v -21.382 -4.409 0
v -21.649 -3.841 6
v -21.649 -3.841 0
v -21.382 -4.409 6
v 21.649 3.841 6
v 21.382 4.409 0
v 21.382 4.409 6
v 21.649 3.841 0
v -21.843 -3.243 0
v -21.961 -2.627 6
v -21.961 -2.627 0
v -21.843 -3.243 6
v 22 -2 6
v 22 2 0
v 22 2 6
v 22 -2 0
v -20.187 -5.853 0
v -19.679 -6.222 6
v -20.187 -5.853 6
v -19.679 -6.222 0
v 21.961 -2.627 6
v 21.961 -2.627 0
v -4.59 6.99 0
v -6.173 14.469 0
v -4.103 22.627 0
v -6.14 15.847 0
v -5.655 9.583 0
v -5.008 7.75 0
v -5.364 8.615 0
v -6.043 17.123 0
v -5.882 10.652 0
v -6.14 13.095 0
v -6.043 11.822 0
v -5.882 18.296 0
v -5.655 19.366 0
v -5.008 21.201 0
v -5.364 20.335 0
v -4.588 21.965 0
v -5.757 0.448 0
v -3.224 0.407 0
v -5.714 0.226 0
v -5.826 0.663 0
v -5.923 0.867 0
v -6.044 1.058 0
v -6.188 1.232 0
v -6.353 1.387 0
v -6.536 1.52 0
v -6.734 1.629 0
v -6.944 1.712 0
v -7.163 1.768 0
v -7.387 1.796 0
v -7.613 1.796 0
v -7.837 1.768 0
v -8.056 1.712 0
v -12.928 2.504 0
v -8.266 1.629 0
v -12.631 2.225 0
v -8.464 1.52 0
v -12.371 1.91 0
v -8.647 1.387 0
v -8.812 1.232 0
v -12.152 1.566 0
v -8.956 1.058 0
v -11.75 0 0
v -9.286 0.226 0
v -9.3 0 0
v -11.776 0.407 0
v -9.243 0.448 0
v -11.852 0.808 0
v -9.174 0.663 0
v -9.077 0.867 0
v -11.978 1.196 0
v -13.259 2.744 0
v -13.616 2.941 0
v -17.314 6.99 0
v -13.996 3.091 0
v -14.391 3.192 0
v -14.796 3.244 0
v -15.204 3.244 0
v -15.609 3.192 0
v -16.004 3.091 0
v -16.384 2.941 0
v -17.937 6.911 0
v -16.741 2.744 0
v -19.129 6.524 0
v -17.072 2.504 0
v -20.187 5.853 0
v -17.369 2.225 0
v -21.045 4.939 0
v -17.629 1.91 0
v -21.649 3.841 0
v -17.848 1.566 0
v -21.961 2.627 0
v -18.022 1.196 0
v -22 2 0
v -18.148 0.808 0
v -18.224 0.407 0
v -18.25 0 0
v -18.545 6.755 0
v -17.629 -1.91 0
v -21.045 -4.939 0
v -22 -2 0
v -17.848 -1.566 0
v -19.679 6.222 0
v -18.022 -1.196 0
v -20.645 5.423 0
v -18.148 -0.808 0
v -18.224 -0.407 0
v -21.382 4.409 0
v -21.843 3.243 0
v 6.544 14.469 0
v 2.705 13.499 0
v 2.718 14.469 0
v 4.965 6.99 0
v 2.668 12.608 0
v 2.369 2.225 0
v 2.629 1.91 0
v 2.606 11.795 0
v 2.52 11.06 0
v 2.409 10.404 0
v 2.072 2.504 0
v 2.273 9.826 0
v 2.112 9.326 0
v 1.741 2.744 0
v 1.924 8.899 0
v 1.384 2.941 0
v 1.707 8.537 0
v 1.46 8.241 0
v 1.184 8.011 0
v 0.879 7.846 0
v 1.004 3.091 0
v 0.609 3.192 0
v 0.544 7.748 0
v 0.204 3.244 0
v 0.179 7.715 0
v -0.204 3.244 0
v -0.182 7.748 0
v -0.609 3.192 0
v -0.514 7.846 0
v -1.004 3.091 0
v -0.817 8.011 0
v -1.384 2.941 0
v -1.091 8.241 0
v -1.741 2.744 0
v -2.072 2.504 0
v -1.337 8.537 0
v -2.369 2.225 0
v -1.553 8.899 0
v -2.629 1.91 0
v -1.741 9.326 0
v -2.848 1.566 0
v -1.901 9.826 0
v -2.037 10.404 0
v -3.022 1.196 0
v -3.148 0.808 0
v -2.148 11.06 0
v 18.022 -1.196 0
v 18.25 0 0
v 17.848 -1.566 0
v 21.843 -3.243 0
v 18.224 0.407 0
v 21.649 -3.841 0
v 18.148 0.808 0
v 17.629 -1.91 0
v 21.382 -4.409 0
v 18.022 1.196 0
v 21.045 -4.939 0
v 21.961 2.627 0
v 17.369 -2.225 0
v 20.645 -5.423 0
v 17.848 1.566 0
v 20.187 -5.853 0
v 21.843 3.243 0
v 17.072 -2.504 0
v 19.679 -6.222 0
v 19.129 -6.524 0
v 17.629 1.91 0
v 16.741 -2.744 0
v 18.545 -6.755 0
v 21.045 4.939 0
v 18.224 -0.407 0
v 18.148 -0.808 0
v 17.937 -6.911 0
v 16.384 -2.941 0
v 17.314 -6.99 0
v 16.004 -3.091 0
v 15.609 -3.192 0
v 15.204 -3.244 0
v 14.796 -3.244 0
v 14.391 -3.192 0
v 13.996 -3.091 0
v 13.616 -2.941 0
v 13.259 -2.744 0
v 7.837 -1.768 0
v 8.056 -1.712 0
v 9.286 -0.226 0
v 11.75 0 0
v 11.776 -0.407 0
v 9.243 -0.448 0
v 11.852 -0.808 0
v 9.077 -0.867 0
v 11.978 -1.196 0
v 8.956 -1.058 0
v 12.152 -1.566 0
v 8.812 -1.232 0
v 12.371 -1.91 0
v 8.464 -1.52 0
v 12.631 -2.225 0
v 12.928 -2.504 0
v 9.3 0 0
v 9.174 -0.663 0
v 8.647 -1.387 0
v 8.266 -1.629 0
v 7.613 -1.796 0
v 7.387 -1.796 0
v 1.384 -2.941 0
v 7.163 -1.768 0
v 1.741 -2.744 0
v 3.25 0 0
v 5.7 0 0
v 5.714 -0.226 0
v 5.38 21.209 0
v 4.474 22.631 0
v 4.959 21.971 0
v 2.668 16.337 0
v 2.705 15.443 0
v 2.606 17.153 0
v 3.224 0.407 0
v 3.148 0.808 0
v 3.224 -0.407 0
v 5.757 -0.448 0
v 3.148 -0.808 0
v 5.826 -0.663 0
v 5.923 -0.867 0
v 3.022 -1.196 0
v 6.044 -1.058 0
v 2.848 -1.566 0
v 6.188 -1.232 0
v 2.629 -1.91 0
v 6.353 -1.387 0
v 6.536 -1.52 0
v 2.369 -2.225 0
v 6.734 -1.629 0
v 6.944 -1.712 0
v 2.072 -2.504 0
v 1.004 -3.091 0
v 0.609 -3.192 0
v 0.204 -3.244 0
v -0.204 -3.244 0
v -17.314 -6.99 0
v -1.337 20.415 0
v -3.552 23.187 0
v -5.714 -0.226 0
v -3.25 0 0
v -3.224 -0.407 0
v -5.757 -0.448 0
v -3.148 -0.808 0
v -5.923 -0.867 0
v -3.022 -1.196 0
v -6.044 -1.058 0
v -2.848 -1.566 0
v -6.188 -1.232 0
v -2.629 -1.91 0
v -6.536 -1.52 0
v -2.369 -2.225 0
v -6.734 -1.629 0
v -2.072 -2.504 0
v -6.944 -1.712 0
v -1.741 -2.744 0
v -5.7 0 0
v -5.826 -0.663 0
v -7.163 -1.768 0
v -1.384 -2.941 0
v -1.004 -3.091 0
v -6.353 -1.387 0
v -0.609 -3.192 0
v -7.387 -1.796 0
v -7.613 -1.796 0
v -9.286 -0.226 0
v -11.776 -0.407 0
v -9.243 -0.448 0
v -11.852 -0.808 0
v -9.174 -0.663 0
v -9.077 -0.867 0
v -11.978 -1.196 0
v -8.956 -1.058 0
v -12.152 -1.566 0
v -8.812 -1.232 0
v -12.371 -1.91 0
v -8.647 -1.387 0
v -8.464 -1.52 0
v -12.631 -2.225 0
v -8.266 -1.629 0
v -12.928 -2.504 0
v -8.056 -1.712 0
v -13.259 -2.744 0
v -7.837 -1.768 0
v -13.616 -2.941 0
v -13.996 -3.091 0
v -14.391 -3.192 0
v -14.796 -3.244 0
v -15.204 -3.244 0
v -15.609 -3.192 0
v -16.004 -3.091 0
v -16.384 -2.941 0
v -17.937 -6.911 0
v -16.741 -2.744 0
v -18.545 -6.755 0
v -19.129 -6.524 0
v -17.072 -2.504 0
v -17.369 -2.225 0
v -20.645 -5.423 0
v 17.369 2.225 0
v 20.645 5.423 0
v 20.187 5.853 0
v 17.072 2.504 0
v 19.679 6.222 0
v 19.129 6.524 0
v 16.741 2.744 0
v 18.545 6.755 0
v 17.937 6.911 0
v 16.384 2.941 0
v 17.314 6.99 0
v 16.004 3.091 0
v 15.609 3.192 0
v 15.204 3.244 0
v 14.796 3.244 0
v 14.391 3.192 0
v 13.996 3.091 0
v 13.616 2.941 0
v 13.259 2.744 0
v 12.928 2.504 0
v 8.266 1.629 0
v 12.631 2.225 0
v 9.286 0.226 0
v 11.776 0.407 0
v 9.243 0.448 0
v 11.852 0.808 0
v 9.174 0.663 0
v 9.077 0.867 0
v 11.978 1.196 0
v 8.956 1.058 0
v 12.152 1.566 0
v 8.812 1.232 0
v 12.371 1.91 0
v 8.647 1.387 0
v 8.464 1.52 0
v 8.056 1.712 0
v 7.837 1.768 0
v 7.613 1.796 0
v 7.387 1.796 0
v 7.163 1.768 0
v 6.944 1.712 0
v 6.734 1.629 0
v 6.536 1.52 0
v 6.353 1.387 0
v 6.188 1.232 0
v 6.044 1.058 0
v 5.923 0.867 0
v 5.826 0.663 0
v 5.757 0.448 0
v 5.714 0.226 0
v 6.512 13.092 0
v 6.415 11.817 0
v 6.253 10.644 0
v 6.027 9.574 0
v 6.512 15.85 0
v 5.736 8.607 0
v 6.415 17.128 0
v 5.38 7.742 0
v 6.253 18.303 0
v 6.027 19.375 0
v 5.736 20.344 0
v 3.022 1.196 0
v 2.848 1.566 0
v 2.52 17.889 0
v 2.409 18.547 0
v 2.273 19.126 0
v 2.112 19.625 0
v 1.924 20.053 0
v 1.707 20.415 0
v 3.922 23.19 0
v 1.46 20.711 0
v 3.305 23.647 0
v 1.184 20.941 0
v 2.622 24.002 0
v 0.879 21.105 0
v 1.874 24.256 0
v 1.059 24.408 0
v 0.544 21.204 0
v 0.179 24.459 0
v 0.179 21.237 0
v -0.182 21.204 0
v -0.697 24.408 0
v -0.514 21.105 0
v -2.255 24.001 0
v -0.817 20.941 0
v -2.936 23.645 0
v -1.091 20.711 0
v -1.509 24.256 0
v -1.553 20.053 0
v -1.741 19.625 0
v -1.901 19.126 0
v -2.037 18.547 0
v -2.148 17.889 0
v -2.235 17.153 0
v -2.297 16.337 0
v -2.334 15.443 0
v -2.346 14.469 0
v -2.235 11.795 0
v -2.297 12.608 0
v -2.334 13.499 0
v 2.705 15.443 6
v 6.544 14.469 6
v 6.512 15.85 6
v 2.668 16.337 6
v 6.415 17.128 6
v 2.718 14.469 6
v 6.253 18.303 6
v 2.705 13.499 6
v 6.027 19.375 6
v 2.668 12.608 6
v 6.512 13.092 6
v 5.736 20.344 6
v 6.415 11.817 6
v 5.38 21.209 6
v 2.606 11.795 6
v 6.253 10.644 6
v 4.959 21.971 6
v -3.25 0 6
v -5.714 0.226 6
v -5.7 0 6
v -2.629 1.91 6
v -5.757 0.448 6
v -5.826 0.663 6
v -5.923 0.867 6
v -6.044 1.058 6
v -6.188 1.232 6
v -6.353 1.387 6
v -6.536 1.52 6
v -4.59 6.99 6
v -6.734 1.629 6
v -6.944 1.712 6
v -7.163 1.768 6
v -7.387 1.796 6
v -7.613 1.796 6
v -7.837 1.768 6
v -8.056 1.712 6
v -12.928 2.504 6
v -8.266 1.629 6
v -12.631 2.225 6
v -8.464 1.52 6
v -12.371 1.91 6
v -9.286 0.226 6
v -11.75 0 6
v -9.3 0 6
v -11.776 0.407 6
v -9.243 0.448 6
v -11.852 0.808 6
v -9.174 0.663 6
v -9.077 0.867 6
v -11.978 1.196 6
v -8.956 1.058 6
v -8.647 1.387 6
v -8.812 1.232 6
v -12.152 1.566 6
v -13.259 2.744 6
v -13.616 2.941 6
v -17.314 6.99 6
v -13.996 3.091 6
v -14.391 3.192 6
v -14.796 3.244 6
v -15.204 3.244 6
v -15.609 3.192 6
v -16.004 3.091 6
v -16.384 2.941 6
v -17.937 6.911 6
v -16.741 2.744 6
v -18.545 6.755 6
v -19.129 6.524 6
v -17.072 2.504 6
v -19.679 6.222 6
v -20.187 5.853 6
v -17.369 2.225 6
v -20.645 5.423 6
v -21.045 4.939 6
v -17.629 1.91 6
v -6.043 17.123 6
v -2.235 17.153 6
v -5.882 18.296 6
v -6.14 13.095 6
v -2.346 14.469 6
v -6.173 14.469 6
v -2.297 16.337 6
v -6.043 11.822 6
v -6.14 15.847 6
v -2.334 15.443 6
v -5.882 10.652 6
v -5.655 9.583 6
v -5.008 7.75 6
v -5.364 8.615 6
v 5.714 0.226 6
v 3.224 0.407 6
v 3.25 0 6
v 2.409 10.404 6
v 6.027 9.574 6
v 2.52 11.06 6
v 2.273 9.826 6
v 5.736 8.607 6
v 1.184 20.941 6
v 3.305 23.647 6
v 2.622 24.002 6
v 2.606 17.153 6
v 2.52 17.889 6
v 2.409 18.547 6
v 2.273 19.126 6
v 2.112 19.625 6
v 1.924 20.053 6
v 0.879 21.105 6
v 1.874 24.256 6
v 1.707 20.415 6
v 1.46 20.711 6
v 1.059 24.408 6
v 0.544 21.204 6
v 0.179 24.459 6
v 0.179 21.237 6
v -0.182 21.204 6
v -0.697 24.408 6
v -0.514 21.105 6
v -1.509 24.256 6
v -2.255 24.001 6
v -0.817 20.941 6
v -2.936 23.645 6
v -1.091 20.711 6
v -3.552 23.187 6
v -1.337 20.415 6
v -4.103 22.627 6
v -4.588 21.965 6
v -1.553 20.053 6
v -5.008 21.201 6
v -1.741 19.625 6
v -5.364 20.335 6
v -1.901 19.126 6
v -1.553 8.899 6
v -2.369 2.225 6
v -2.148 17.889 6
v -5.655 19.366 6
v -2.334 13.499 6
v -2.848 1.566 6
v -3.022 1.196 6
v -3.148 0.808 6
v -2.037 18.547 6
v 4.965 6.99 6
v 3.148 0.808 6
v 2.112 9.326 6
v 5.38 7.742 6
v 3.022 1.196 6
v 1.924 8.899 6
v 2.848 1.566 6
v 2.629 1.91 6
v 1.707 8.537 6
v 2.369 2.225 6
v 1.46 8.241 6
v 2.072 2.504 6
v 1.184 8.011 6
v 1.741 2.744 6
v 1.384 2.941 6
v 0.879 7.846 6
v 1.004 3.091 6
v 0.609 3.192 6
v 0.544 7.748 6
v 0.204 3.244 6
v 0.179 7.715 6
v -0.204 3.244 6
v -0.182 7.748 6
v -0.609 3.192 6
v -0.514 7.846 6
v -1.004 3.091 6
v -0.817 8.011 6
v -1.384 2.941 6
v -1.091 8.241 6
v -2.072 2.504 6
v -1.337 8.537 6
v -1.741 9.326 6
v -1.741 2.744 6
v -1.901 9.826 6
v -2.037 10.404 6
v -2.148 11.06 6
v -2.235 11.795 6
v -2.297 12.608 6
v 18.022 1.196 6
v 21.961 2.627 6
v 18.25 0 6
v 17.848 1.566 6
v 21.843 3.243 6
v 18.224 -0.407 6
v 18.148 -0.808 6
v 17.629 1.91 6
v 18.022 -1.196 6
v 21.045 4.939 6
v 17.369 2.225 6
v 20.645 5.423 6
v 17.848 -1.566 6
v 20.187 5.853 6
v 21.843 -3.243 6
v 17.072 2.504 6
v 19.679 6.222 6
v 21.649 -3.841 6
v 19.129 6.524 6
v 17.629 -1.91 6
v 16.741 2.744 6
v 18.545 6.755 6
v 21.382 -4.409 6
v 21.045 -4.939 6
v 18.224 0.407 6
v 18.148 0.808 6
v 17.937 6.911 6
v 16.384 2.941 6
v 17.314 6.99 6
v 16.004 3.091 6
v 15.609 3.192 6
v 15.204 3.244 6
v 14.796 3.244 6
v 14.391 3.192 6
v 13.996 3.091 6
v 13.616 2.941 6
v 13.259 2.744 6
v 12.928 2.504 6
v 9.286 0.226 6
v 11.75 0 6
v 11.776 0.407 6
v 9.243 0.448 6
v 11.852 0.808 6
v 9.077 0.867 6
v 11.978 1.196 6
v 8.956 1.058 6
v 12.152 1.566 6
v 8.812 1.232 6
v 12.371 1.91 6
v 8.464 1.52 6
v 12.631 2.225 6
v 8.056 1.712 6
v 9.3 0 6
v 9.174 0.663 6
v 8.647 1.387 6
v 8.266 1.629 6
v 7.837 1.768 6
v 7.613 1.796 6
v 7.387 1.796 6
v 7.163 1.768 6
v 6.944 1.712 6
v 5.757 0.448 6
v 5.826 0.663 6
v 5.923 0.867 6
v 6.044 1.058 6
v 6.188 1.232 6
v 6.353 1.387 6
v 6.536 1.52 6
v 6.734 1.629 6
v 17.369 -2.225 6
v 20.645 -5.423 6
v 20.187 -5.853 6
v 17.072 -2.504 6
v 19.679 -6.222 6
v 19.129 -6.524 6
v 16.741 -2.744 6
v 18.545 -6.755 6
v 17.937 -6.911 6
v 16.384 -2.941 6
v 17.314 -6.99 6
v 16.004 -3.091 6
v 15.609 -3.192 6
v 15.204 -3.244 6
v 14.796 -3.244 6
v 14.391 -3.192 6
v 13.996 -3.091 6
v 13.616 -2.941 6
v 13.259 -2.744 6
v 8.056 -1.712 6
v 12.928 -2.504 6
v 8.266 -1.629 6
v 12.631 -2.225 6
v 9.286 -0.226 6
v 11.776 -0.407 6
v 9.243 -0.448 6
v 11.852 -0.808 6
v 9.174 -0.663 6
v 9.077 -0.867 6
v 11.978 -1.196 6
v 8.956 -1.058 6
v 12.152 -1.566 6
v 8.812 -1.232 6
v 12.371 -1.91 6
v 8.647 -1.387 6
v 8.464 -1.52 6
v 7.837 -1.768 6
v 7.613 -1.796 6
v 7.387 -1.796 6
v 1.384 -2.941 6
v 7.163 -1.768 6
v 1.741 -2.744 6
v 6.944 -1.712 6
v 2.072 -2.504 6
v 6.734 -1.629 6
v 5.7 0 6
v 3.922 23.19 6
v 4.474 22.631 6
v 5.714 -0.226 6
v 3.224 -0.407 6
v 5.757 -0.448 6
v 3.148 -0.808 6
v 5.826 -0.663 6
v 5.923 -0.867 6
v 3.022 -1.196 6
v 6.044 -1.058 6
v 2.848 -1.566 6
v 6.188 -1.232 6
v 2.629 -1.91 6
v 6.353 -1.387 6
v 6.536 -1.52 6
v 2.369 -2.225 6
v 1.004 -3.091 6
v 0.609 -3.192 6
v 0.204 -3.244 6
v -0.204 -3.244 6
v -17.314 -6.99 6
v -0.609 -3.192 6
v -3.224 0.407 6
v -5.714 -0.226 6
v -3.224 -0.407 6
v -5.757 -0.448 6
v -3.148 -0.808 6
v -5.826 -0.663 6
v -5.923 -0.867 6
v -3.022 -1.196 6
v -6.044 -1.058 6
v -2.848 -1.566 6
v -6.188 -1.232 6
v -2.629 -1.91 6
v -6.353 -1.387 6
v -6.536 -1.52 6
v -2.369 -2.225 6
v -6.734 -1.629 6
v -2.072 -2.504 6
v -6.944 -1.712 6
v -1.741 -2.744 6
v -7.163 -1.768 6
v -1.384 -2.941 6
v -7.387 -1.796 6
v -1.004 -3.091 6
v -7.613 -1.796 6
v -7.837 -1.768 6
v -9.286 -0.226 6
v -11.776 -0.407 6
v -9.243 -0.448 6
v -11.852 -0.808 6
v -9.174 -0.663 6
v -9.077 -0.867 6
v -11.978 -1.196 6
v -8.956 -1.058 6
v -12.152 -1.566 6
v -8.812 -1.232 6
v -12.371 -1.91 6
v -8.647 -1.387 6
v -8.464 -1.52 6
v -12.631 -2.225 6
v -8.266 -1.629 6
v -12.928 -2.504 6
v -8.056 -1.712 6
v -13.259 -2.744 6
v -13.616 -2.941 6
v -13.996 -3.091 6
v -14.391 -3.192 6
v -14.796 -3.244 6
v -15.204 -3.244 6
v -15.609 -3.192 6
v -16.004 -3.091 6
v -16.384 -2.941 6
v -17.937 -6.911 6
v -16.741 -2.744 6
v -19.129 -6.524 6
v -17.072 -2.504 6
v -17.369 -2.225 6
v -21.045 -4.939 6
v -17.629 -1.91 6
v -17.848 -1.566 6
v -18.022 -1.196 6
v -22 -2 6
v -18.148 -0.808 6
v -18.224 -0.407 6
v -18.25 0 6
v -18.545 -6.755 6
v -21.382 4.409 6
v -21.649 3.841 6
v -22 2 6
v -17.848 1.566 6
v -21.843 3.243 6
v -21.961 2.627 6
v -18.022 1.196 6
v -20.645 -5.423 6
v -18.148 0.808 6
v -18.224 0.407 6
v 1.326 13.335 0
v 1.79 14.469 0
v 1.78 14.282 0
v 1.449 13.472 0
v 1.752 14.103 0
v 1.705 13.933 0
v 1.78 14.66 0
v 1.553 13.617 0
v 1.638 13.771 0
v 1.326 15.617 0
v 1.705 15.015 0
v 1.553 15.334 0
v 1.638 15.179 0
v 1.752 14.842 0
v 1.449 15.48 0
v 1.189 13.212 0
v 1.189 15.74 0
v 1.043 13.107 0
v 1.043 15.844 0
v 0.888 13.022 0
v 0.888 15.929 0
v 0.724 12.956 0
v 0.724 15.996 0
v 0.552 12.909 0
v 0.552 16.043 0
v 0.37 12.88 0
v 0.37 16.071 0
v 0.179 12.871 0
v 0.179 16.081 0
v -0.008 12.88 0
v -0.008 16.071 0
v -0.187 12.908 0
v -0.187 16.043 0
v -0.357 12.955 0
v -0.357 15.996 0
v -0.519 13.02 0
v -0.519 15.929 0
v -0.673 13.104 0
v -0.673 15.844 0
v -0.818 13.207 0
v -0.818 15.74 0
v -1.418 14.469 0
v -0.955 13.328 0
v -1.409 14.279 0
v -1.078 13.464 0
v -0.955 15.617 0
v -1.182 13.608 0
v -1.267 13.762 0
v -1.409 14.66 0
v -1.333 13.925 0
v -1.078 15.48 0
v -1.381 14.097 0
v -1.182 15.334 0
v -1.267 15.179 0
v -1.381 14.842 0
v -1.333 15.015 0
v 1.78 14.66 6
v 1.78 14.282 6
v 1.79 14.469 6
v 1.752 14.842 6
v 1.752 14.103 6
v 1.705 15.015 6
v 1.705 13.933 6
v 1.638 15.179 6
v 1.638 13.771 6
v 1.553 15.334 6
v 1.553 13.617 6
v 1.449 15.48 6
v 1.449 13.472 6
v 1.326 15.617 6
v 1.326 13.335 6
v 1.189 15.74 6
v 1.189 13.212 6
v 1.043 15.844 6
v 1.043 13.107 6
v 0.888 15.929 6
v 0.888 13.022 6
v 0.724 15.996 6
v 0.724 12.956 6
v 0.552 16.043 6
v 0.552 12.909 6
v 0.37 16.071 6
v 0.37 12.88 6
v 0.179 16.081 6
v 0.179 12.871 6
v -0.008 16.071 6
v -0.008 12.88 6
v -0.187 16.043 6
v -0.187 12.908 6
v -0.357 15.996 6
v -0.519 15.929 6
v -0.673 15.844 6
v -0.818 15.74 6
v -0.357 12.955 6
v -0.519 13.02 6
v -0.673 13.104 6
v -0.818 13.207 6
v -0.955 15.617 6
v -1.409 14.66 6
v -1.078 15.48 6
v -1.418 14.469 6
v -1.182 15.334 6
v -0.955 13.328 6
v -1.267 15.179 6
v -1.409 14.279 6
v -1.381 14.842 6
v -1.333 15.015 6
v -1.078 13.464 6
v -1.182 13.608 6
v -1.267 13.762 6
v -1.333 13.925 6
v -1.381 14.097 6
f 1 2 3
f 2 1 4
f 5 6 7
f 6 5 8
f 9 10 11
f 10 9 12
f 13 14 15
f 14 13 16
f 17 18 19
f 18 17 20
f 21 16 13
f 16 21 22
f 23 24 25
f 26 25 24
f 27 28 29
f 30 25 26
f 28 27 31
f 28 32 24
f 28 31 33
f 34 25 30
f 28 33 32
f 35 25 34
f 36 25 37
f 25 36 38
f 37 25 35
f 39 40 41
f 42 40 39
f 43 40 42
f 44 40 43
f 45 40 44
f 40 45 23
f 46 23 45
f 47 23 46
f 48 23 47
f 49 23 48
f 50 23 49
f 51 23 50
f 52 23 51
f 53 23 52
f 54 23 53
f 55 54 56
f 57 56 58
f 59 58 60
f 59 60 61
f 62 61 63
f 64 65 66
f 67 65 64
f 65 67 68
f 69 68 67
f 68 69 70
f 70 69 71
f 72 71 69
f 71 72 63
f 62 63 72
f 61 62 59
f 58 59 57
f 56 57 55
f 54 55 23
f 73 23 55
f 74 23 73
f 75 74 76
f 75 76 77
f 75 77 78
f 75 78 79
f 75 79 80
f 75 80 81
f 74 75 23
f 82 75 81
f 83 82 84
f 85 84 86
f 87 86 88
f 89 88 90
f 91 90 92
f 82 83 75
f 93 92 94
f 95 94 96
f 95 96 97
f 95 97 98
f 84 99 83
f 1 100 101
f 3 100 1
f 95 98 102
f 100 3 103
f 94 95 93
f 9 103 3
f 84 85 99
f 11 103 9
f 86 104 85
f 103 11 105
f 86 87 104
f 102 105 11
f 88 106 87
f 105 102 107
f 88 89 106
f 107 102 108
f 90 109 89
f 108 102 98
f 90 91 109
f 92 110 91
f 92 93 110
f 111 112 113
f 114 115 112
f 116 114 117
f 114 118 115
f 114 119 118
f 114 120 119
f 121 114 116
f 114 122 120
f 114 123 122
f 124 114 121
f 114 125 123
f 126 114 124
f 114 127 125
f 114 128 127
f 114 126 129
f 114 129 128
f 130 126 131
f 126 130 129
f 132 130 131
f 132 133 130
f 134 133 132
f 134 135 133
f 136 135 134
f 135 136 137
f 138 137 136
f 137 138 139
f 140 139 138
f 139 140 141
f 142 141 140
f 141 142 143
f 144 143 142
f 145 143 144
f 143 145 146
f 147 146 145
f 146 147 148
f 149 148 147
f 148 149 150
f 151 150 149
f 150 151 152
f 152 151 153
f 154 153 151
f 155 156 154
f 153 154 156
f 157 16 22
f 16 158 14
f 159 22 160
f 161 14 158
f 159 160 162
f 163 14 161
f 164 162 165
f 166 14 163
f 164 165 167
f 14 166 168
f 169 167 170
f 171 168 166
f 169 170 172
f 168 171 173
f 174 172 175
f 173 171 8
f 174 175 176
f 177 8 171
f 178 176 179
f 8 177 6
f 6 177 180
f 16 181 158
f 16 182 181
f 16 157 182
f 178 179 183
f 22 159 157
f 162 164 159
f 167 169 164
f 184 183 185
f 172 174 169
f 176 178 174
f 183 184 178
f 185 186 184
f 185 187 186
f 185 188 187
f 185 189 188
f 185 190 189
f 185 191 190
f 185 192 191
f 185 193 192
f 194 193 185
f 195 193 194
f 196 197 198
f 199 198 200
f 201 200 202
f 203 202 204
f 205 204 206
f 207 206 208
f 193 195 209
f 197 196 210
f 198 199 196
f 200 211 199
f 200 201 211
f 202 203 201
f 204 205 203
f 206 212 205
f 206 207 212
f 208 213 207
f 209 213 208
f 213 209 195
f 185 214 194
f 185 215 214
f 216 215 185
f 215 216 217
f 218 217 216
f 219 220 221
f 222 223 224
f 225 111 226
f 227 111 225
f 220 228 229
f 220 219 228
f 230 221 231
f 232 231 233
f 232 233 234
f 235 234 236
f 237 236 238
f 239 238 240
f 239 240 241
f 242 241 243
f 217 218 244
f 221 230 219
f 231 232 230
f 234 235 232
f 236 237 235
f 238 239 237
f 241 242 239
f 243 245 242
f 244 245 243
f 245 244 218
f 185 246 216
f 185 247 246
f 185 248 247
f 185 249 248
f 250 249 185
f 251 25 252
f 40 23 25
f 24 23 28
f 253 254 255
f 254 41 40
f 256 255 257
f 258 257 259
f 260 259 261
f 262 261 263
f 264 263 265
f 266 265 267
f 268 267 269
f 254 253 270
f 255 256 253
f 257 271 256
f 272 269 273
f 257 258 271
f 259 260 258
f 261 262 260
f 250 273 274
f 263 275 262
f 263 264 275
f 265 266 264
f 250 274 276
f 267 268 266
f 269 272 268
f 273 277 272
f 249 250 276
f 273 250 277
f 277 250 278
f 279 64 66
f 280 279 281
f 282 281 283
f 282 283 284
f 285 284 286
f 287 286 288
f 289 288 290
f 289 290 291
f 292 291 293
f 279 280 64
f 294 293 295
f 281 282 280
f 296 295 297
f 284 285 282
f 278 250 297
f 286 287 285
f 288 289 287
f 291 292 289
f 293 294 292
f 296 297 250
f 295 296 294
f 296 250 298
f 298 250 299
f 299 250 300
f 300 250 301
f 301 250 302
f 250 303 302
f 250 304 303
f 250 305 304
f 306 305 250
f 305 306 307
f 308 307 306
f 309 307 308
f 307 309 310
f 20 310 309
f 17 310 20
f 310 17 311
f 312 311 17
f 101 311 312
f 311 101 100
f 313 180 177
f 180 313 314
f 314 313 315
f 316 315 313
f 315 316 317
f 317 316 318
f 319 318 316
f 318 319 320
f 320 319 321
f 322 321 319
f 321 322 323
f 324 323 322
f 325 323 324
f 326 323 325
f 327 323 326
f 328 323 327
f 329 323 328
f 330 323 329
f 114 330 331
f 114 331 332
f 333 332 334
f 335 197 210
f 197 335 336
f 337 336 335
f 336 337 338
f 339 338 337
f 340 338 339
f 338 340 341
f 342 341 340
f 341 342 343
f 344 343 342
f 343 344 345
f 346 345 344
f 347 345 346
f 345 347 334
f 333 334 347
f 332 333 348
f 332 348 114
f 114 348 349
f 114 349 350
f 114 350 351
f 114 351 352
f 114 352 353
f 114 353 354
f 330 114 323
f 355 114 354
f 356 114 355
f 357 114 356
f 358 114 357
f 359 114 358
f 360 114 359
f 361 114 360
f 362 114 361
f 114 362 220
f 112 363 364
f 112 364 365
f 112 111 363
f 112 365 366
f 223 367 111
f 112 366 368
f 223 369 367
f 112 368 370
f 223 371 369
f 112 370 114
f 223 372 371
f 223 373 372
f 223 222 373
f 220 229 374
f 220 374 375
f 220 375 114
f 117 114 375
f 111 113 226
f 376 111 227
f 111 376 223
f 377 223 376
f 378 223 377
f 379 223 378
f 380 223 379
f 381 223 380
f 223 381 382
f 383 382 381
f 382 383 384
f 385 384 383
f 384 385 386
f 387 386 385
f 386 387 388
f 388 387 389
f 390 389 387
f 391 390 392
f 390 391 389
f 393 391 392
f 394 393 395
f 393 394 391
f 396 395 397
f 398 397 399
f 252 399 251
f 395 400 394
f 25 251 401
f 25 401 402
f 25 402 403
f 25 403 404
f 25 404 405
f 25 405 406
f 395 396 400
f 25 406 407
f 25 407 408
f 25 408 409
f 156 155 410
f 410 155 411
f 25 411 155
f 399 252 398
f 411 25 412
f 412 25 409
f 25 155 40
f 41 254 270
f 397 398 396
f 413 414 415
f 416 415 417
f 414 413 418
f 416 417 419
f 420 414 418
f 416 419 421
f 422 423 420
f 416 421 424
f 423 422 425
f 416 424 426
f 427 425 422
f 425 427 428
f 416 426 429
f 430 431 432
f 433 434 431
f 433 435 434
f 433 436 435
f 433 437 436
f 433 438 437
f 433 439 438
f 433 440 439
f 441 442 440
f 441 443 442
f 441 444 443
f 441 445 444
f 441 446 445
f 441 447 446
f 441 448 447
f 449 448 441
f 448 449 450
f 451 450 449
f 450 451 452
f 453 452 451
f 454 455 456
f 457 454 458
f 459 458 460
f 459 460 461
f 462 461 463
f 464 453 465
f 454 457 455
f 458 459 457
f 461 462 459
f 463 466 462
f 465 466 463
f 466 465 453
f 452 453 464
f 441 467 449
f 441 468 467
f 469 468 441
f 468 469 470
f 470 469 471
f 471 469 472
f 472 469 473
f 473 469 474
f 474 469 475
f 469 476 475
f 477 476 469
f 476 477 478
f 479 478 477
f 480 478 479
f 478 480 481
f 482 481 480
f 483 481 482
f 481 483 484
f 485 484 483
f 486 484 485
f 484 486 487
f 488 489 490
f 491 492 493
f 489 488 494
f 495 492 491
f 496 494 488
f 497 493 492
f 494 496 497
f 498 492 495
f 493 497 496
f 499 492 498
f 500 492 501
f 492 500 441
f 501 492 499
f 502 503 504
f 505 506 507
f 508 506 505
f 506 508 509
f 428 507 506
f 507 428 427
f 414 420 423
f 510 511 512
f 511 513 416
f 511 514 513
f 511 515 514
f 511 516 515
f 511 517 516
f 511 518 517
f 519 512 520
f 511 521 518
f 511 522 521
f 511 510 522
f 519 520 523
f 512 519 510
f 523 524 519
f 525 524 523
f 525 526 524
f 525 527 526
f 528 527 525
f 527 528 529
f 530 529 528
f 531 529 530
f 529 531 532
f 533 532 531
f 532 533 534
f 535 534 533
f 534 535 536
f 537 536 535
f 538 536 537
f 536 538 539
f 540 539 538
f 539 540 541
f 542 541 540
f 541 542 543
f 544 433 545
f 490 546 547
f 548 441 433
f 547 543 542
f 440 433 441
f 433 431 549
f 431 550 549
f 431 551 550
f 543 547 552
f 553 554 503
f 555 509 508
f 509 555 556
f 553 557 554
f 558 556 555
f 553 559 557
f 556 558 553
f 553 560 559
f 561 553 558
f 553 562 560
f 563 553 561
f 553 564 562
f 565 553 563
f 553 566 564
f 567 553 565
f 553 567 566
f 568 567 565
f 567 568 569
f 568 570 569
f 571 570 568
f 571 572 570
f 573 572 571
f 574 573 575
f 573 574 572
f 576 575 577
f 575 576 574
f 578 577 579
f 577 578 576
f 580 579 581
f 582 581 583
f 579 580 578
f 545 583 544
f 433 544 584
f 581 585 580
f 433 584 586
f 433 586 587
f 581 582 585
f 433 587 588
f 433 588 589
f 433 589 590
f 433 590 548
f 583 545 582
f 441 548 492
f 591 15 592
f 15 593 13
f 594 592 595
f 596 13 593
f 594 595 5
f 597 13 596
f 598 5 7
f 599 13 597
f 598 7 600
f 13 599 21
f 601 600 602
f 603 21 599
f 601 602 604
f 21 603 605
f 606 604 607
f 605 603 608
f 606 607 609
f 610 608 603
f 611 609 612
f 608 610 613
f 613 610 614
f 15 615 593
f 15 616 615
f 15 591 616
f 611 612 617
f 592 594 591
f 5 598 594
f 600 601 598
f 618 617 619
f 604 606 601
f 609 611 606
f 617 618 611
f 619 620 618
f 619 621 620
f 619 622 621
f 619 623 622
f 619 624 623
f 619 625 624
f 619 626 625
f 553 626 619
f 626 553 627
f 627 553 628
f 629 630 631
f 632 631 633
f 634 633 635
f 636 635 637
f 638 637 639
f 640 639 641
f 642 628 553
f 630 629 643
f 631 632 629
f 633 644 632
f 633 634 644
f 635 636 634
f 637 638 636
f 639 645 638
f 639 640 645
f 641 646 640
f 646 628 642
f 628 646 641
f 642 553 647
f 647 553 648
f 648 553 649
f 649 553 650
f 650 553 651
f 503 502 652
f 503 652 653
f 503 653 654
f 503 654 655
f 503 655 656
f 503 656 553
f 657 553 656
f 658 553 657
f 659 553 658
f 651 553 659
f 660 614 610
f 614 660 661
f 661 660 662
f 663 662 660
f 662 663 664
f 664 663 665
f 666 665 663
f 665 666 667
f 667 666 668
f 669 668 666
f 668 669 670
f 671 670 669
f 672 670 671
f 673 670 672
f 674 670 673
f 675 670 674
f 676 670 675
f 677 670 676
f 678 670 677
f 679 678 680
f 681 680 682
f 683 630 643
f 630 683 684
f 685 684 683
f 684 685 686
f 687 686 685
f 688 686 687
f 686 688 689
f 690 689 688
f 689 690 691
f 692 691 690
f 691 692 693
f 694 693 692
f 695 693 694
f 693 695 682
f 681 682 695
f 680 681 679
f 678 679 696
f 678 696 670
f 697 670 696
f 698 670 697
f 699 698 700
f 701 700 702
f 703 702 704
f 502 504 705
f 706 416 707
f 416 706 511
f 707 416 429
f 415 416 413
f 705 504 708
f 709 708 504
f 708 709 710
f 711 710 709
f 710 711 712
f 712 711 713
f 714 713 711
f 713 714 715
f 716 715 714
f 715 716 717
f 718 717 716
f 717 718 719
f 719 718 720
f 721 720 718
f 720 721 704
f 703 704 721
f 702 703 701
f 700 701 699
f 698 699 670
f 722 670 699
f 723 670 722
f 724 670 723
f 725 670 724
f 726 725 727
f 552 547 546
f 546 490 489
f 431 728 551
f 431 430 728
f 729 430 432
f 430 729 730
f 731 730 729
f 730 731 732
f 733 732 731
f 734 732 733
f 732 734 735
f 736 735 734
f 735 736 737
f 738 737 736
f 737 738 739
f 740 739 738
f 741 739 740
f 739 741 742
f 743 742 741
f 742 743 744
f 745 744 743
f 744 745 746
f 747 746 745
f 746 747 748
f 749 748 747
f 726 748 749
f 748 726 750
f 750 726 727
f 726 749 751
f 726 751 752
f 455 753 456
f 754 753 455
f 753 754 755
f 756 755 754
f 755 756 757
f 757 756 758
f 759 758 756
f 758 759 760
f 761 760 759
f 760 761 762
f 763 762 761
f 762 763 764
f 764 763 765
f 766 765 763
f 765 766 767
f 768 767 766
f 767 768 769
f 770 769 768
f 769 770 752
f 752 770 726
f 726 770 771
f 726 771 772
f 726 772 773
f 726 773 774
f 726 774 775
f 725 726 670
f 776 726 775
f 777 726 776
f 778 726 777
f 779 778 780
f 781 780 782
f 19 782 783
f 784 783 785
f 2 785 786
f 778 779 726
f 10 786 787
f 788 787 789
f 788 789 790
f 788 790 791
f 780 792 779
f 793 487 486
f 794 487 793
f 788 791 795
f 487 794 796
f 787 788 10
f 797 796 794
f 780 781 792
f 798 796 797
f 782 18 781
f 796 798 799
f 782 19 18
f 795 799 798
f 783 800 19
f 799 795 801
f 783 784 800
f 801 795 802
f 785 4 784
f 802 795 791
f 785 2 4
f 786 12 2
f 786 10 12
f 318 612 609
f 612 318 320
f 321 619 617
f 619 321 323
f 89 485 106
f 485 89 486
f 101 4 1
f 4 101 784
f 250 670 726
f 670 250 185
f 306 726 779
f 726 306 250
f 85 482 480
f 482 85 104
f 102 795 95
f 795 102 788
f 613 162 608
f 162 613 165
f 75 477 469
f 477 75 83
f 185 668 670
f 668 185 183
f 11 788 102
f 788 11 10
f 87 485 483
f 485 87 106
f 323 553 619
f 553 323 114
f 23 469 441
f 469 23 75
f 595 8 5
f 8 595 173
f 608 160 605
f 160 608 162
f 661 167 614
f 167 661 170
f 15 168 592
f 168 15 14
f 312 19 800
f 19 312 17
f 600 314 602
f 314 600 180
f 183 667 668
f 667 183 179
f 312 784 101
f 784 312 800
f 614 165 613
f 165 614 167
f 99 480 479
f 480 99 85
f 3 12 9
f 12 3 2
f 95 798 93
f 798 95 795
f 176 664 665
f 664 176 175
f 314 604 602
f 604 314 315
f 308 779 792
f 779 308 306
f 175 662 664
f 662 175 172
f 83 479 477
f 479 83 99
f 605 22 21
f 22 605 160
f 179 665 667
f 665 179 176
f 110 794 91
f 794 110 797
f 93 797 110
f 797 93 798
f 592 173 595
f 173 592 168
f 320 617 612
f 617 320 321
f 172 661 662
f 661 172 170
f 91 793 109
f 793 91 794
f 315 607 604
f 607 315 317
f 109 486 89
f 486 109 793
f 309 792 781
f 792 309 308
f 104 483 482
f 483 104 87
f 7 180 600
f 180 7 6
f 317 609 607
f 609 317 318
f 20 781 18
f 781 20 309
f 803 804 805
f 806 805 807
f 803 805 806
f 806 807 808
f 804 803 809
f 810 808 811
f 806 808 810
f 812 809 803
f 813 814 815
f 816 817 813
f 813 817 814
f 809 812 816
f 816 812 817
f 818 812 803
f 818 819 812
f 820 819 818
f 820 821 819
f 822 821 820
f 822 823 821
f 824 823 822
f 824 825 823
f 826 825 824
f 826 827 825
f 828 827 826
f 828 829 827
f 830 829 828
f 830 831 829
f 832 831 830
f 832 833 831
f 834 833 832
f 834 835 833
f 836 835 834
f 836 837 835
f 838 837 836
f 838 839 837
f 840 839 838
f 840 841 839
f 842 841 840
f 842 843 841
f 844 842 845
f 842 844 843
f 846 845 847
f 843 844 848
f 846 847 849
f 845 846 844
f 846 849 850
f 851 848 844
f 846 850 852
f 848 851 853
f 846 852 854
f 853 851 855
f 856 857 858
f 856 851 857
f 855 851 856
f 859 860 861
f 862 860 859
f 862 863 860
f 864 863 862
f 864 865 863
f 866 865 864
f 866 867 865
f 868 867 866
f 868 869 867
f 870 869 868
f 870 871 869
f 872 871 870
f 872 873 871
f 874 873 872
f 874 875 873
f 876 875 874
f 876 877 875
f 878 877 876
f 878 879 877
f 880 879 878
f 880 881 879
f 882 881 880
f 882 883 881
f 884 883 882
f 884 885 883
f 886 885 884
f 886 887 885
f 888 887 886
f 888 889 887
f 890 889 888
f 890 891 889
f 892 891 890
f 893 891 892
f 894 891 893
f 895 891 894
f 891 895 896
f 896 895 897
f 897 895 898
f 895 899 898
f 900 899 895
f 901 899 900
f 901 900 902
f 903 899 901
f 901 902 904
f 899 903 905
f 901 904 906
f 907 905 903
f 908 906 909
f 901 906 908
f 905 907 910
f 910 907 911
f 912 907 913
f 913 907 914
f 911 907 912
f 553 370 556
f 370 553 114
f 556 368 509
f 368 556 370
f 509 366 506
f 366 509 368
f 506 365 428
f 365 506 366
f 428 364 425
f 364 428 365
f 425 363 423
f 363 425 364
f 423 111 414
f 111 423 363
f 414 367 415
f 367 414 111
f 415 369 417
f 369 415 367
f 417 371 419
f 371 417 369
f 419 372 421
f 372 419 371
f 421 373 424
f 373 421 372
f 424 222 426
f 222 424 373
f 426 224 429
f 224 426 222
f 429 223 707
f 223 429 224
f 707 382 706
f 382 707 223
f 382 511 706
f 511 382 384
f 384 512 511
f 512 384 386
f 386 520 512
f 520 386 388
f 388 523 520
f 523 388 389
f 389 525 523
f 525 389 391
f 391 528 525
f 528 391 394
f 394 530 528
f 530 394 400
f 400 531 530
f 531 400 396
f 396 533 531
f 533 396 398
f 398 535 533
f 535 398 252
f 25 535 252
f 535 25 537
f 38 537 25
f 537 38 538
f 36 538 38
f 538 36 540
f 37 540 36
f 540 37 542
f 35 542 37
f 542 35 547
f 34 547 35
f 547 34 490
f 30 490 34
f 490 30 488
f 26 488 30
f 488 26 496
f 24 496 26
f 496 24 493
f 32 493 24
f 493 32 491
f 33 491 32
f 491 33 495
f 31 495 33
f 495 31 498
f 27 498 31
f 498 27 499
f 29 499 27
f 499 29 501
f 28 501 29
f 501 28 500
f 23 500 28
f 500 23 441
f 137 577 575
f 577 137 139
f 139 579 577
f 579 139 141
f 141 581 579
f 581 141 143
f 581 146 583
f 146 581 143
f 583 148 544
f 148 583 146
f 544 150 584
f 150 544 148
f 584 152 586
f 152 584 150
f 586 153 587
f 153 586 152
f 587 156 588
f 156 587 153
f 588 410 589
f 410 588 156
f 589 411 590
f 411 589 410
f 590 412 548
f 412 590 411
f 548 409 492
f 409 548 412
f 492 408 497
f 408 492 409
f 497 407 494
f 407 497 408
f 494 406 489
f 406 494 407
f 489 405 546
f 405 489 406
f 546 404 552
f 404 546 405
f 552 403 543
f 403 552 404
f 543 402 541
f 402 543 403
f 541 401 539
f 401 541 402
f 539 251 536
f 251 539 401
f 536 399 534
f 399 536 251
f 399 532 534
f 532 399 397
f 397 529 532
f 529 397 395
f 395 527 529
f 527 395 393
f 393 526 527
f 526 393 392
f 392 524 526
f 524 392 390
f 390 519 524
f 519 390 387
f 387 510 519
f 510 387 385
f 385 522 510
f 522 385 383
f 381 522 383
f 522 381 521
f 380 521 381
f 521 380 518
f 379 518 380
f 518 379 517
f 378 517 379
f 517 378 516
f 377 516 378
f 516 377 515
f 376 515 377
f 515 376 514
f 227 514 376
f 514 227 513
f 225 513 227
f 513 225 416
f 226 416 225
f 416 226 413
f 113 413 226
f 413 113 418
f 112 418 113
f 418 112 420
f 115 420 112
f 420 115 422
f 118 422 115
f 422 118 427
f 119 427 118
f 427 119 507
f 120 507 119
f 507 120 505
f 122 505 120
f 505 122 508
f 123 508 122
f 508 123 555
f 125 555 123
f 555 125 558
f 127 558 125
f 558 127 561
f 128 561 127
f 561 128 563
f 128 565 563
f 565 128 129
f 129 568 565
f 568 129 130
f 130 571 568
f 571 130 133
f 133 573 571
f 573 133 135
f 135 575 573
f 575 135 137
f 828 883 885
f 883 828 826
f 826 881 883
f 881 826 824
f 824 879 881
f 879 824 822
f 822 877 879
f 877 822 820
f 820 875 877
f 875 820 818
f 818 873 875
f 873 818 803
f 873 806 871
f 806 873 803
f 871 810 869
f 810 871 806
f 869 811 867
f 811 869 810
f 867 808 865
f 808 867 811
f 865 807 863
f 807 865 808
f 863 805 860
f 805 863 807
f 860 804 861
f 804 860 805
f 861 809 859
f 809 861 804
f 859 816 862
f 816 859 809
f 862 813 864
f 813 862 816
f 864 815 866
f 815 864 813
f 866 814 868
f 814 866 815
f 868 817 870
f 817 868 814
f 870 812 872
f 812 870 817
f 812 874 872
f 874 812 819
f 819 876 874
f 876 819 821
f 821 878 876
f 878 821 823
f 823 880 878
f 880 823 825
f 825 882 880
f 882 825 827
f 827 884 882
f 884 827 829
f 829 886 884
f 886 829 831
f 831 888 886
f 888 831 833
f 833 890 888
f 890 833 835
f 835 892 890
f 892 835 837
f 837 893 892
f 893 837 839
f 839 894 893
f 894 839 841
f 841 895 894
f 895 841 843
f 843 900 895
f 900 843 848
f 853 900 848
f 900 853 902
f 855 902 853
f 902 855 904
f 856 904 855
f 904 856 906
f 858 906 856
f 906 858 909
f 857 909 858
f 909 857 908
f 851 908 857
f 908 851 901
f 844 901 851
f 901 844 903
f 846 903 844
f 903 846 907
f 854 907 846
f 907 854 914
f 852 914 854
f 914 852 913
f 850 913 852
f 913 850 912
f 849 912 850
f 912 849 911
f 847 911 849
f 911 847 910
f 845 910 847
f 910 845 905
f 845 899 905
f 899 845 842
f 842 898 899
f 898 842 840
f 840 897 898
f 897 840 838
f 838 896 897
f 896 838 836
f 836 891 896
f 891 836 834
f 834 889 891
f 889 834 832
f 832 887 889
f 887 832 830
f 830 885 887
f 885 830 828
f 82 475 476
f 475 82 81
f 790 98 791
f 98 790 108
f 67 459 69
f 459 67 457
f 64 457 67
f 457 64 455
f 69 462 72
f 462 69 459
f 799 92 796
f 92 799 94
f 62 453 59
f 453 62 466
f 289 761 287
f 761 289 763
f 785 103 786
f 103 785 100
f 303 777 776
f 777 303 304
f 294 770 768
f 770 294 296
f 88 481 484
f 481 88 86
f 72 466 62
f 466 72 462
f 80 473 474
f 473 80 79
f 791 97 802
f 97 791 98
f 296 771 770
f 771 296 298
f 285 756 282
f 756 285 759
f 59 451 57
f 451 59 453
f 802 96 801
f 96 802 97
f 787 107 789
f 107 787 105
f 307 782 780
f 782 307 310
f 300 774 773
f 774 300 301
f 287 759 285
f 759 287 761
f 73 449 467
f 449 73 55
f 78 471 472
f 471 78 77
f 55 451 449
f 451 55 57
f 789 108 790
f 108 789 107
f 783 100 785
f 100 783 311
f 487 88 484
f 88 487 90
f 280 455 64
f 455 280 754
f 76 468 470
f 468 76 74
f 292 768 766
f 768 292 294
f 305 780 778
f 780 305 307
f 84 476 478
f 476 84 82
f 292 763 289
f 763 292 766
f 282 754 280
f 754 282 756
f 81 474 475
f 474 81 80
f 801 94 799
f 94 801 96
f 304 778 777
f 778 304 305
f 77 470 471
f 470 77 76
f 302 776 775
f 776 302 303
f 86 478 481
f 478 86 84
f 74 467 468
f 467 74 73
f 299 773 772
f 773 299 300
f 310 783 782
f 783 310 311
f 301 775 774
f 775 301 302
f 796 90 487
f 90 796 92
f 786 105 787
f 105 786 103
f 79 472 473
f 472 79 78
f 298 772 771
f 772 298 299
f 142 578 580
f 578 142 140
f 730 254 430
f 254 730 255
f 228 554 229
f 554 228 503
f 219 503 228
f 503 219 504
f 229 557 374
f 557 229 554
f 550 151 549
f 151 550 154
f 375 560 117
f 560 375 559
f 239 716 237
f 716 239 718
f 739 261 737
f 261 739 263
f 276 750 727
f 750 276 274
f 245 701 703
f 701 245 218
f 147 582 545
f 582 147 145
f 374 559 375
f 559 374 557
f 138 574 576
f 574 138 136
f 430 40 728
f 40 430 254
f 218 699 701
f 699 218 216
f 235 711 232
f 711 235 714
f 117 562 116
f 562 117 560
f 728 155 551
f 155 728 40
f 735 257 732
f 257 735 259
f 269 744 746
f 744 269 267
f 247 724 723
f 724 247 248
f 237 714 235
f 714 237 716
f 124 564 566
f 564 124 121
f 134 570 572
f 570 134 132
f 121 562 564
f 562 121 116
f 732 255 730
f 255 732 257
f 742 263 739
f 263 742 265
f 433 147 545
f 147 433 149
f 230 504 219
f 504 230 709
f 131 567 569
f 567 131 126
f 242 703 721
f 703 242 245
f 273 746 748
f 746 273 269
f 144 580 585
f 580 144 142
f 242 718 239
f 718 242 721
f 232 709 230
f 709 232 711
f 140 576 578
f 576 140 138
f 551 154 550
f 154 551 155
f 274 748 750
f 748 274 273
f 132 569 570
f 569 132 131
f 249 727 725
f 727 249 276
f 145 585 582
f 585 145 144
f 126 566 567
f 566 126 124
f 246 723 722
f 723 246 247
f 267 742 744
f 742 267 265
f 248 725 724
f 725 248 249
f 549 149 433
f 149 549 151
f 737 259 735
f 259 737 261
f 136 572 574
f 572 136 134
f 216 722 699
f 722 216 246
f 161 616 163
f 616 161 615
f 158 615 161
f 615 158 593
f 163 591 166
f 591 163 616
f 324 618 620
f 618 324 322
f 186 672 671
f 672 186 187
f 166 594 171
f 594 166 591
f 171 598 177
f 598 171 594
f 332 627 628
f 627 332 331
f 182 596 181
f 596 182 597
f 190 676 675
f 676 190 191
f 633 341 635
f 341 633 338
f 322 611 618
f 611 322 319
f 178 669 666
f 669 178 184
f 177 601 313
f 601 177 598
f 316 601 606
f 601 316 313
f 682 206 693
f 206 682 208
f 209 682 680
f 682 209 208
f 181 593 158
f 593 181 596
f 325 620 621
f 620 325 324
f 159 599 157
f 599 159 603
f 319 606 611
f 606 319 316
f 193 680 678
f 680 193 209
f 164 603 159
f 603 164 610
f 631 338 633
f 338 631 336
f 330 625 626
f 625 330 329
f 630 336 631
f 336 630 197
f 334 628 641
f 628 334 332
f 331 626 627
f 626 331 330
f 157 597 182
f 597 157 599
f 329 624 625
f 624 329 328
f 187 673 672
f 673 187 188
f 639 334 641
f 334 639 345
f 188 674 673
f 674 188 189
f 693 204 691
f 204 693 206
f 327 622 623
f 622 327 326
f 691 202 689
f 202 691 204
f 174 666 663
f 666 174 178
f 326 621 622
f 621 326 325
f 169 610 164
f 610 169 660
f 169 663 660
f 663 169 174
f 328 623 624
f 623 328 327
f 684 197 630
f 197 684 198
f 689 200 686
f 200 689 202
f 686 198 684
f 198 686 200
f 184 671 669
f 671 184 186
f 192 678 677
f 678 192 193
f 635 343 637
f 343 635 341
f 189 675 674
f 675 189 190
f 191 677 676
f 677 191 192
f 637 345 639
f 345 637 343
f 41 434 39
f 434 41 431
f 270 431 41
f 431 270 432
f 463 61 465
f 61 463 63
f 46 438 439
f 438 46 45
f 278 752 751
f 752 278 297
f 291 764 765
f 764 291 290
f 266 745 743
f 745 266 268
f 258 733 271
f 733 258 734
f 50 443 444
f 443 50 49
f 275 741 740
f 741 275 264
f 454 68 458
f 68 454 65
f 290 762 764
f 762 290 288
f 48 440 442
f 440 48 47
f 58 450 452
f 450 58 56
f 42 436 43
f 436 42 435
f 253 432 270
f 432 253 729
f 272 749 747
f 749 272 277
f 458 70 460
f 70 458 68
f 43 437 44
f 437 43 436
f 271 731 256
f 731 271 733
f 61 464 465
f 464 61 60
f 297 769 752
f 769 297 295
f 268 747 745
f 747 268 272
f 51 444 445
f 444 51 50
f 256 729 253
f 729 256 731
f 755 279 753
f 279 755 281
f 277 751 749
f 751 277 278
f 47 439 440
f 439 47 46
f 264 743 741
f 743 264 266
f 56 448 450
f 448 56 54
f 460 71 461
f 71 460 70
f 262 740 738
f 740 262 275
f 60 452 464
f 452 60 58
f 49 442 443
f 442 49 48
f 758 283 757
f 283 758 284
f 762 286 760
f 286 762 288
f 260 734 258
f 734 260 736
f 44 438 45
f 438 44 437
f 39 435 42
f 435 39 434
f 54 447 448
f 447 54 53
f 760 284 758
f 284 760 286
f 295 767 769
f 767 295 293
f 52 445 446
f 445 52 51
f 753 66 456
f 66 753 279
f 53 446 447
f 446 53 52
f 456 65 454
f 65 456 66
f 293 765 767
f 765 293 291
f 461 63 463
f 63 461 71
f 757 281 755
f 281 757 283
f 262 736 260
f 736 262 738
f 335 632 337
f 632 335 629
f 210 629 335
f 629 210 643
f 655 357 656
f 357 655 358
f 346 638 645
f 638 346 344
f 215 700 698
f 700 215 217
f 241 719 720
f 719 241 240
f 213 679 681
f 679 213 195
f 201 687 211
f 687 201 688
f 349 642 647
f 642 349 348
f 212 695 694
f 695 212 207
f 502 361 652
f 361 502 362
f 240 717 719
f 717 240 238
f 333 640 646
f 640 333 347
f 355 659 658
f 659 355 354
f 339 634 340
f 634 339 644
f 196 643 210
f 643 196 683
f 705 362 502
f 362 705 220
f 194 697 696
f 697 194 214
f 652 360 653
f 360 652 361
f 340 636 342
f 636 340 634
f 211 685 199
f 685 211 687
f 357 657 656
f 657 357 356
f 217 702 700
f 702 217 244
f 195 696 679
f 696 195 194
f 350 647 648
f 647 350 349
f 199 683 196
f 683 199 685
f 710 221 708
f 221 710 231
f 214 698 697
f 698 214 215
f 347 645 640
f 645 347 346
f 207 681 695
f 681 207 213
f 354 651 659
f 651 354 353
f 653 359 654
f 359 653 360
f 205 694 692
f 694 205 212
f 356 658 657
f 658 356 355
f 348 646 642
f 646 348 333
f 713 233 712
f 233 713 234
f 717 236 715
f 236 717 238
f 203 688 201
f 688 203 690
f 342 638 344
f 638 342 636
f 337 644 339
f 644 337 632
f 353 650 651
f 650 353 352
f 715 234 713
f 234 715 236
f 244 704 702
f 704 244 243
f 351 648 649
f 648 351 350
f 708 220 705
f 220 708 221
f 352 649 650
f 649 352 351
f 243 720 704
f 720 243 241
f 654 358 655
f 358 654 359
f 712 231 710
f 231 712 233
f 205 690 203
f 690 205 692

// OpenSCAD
$fn = 50;


difference() {
	union() {
		hull() {
			translate(v = [-17.0000000000, 2.0000000000, 0]) {
				cylinder(h = 6, r = 5);
			}
			translate(v = [17.0000000000, 2.0000000000, 0]) {
				cylinder(h = 6, r = 5);
			}
			translate(v = [-17.0000000000, -2.0000000000, 0]) {
				cylinder(h = 6, r = 5);
			}
			translate(v = [17.0000000000, -2.0000000000, 0]) {
				cylinder(h = 6, r = 5);
			}
		}
		translate(v = [0, 24, 0]) {
			linear_extrude(height = 6) {
				text(font = "DejaVu Sans Mono:style=Bold", halign = "center", size = 19.0000000000, text = "0", valign = "top");
			}
		}
	}
	union() {
		translate(v = [-15.0000000000, 0.0000000000, 0]) {
			translate(v = [0, 0, -100]) {
				cylinder(h = 200, r = 3.2500000000);
			}
		}
		translate(v = [0, 0, -100]) {
			cylinder(h = 200, r = 3.2500000000);
		}
		translate(v = [15.0000000000, 0.0000000000, 0]) {
			translate(v = [0, 0, -100]) {
				cylinder(h = 200, r = 3.2500000000);
			}
		}
		translate(v = [-15.0000000000, 0.0000000000, 0]) {
			translate(v = [0, 0, -100]) {
				cylinder(h = 200, r = 1.8000000000);
			}
		}
		translate(v = [-7.5000000000, 0.0000000000, 0]) {
			translate(v = [0, 0, -100]) {
				cylinder(h = 200, r = 1.8000000000);
			}
		}
		translate(v = [0, 0, -100]) {
			cylinder(h = 200, r = 1.8000000000);
		}
		translate(v = [7.5000000000, 0.0000000000, 0]) {
			translate(v = [0, 0, -100]) {
				cylinder(h = 200, r = 1.8000000000);
			}
		}
		translate(v = [15.0000000000, 0.0000000000, 0]) {
			translate(v = [0, 0, -100]) {
				cylinder(h = 200, r = 1.8000000000);
			}
		}
	}
}
